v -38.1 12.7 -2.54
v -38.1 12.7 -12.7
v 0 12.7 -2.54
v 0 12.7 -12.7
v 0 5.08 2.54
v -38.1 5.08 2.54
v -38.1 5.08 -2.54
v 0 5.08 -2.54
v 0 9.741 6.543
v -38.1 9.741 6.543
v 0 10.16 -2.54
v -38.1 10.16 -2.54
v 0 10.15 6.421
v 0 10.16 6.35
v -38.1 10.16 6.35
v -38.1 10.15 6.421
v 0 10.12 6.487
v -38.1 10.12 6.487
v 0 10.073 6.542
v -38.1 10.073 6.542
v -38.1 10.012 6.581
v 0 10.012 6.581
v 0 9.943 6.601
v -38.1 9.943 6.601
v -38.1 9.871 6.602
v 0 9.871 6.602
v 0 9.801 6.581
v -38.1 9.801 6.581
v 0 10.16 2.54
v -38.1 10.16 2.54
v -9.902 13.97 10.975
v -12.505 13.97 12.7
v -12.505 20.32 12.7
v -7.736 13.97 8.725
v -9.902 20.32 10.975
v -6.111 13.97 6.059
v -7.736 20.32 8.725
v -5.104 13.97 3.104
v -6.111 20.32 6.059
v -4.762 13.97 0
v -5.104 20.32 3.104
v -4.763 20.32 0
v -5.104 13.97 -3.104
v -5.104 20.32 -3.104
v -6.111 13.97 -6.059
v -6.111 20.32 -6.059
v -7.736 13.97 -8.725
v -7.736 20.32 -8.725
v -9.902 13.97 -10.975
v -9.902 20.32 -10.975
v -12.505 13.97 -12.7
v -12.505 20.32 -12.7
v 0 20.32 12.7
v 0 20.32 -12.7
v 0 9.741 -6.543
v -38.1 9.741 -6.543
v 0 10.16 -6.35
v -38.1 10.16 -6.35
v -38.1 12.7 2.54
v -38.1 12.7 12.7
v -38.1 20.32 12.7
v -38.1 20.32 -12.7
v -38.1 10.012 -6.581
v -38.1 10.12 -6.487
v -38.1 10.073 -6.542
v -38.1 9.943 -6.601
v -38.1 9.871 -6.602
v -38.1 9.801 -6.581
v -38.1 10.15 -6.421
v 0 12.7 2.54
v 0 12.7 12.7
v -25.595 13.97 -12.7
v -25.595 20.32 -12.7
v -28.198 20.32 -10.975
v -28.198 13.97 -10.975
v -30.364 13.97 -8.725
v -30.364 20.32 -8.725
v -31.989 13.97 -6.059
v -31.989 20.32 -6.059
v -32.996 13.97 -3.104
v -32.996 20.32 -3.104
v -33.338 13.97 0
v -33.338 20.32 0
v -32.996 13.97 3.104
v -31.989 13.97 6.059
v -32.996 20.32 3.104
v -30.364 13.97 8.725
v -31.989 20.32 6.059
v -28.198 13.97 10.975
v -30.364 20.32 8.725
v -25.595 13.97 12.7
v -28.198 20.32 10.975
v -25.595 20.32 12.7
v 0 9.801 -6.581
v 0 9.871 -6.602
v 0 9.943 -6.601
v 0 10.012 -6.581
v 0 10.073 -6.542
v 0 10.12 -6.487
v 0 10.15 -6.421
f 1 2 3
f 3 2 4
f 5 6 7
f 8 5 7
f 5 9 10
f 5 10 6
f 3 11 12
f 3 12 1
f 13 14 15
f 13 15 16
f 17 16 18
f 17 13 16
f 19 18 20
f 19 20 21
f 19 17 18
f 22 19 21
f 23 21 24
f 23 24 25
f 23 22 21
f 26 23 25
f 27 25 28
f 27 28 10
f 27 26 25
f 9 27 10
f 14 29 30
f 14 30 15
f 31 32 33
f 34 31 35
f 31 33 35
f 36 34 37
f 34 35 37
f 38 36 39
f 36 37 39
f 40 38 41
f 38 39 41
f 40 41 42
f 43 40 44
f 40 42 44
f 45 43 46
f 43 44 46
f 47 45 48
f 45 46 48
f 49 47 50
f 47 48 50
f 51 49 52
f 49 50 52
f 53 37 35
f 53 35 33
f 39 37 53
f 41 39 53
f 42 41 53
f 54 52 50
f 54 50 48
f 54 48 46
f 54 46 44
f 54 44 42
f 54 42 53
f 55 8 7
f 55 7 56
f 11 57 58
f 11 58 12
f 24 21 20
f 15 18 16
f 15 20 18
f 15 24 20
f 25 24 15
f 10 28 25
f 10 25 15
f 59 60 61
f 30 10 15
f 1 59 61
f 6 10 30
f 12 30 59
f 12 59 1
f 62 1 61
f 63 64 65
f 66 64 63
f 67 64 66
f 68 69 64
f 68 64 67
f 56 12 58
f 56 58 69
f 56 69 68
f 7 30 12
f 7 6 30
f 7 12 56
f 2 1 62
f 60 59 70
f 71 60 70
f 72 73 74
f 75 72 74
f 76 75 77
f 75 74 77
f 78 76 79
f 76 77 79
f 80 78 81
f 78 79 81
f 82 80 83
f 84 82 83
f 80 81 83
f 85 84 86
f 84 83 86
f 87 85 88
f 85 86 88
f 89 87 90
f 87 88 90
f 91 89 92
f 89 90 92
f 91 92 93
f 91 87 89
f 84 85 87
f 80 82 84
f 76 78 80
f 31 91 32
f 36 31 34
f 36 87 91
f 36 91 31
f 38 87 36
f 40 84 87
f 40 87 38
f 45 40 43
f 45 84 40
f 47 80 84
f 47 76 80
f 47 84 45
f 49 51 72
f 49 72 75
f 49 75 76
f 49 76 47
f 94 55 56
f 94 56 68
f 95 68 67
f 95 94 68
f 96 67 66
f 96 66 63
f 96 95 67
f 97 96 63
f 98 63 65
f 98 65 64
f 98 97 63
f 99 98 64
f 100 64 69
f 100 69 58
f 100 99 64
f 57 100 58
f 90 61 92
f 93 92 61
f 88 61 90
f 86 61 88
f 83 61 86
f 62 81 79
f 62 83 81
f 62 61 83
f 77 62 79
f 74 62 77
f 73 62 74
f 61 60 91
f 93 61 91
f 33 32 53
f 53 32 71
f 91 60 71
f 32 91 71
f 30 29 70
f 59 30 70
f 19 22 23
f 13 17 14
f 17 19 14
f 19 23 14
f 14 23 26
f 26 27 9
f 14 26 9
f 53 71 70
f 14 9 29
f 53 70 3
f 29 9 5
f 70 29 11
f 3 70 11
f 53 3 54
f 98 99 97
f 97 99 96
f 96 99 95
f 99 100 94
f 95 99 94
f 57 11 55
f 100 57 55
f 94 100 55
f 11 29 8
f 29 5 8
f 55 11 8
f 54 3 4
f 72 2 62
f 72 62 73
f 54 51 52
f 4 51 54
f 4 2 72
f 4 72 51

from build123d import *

# Parameters (mm, degrees)
SKETCH10_W          = 5.08
SKETCH10_H          = 2.54
BOSS_EXTRUDE3_DEPTH = 38.1
SKETCH11_W          = 38.1
SKETCH11_H          = 25.4
BOSS_EXTRUDE4_DEPTH = 7.62
SKETCH12_R          = 14.2875
CUT_EXTRUDE1_DEPTH  = 6.35


with BuildPart() as part:
    # Sketch10 → Boss-Extrude3 (new body)
    with BuildSketch(Plane(origin=(0, 0, 0), x_dir=(0, 0, -1), z_dir=(1, 0, 0))):
        with BuildLine():
            Line((6.35, 10.16), (-6.35, 10.16))
            ThreePointArc((-6.35, 10.16), (-6.580814495, 10.012022021), (-6.542688341, 9.740509205))
            Line((-6.542688341, 9.740509205), (-2.54, 5.08))
            Line((-2.54, 5.08), (2.54, 5.08))
            Line((2.54, 5.08), (6.542688341, 9.740509205))
            ThreePointArc((6.542688341, 9.740509205), (6.580814495, 10.012022021), (6.35, 10.16))
        make_face()
        with Locations((0, 11.43)):
            Rectangle(SKETCH10_W, SKETCH10_H)
    extrude(amount=-BOSS_EXTRUDE3_DEPTH)

    # Sketch11 → Boss-Extrude4 (add)
    with BuildSketch(Plane(origin=(0, 12.7, 0), x_dir=(1, 0, 0), z_dir=(0, 1, 0))):
        with Locations((-19.05, 0)):
            Rectangle(SKETCH11_W, SKETCH11_H)
    extrude(amount=BOSS_EXTRUDE4_DEPTH)

    # Sketch12 → Cut-Extrude1 (cut)
    with BuildSketch(Plane(origin=(0, 20.32, 0), x_dir=(1, 0, 0), z_dir=(0, 1, 0))):
        with Locations((-19.05, 0)):
            Circle(SKETCH12_R)
    extrude(amount=-CUT_EXTRUDE1_DEPTH, mode=Mode.SUBTRACT)


solid = part.part
